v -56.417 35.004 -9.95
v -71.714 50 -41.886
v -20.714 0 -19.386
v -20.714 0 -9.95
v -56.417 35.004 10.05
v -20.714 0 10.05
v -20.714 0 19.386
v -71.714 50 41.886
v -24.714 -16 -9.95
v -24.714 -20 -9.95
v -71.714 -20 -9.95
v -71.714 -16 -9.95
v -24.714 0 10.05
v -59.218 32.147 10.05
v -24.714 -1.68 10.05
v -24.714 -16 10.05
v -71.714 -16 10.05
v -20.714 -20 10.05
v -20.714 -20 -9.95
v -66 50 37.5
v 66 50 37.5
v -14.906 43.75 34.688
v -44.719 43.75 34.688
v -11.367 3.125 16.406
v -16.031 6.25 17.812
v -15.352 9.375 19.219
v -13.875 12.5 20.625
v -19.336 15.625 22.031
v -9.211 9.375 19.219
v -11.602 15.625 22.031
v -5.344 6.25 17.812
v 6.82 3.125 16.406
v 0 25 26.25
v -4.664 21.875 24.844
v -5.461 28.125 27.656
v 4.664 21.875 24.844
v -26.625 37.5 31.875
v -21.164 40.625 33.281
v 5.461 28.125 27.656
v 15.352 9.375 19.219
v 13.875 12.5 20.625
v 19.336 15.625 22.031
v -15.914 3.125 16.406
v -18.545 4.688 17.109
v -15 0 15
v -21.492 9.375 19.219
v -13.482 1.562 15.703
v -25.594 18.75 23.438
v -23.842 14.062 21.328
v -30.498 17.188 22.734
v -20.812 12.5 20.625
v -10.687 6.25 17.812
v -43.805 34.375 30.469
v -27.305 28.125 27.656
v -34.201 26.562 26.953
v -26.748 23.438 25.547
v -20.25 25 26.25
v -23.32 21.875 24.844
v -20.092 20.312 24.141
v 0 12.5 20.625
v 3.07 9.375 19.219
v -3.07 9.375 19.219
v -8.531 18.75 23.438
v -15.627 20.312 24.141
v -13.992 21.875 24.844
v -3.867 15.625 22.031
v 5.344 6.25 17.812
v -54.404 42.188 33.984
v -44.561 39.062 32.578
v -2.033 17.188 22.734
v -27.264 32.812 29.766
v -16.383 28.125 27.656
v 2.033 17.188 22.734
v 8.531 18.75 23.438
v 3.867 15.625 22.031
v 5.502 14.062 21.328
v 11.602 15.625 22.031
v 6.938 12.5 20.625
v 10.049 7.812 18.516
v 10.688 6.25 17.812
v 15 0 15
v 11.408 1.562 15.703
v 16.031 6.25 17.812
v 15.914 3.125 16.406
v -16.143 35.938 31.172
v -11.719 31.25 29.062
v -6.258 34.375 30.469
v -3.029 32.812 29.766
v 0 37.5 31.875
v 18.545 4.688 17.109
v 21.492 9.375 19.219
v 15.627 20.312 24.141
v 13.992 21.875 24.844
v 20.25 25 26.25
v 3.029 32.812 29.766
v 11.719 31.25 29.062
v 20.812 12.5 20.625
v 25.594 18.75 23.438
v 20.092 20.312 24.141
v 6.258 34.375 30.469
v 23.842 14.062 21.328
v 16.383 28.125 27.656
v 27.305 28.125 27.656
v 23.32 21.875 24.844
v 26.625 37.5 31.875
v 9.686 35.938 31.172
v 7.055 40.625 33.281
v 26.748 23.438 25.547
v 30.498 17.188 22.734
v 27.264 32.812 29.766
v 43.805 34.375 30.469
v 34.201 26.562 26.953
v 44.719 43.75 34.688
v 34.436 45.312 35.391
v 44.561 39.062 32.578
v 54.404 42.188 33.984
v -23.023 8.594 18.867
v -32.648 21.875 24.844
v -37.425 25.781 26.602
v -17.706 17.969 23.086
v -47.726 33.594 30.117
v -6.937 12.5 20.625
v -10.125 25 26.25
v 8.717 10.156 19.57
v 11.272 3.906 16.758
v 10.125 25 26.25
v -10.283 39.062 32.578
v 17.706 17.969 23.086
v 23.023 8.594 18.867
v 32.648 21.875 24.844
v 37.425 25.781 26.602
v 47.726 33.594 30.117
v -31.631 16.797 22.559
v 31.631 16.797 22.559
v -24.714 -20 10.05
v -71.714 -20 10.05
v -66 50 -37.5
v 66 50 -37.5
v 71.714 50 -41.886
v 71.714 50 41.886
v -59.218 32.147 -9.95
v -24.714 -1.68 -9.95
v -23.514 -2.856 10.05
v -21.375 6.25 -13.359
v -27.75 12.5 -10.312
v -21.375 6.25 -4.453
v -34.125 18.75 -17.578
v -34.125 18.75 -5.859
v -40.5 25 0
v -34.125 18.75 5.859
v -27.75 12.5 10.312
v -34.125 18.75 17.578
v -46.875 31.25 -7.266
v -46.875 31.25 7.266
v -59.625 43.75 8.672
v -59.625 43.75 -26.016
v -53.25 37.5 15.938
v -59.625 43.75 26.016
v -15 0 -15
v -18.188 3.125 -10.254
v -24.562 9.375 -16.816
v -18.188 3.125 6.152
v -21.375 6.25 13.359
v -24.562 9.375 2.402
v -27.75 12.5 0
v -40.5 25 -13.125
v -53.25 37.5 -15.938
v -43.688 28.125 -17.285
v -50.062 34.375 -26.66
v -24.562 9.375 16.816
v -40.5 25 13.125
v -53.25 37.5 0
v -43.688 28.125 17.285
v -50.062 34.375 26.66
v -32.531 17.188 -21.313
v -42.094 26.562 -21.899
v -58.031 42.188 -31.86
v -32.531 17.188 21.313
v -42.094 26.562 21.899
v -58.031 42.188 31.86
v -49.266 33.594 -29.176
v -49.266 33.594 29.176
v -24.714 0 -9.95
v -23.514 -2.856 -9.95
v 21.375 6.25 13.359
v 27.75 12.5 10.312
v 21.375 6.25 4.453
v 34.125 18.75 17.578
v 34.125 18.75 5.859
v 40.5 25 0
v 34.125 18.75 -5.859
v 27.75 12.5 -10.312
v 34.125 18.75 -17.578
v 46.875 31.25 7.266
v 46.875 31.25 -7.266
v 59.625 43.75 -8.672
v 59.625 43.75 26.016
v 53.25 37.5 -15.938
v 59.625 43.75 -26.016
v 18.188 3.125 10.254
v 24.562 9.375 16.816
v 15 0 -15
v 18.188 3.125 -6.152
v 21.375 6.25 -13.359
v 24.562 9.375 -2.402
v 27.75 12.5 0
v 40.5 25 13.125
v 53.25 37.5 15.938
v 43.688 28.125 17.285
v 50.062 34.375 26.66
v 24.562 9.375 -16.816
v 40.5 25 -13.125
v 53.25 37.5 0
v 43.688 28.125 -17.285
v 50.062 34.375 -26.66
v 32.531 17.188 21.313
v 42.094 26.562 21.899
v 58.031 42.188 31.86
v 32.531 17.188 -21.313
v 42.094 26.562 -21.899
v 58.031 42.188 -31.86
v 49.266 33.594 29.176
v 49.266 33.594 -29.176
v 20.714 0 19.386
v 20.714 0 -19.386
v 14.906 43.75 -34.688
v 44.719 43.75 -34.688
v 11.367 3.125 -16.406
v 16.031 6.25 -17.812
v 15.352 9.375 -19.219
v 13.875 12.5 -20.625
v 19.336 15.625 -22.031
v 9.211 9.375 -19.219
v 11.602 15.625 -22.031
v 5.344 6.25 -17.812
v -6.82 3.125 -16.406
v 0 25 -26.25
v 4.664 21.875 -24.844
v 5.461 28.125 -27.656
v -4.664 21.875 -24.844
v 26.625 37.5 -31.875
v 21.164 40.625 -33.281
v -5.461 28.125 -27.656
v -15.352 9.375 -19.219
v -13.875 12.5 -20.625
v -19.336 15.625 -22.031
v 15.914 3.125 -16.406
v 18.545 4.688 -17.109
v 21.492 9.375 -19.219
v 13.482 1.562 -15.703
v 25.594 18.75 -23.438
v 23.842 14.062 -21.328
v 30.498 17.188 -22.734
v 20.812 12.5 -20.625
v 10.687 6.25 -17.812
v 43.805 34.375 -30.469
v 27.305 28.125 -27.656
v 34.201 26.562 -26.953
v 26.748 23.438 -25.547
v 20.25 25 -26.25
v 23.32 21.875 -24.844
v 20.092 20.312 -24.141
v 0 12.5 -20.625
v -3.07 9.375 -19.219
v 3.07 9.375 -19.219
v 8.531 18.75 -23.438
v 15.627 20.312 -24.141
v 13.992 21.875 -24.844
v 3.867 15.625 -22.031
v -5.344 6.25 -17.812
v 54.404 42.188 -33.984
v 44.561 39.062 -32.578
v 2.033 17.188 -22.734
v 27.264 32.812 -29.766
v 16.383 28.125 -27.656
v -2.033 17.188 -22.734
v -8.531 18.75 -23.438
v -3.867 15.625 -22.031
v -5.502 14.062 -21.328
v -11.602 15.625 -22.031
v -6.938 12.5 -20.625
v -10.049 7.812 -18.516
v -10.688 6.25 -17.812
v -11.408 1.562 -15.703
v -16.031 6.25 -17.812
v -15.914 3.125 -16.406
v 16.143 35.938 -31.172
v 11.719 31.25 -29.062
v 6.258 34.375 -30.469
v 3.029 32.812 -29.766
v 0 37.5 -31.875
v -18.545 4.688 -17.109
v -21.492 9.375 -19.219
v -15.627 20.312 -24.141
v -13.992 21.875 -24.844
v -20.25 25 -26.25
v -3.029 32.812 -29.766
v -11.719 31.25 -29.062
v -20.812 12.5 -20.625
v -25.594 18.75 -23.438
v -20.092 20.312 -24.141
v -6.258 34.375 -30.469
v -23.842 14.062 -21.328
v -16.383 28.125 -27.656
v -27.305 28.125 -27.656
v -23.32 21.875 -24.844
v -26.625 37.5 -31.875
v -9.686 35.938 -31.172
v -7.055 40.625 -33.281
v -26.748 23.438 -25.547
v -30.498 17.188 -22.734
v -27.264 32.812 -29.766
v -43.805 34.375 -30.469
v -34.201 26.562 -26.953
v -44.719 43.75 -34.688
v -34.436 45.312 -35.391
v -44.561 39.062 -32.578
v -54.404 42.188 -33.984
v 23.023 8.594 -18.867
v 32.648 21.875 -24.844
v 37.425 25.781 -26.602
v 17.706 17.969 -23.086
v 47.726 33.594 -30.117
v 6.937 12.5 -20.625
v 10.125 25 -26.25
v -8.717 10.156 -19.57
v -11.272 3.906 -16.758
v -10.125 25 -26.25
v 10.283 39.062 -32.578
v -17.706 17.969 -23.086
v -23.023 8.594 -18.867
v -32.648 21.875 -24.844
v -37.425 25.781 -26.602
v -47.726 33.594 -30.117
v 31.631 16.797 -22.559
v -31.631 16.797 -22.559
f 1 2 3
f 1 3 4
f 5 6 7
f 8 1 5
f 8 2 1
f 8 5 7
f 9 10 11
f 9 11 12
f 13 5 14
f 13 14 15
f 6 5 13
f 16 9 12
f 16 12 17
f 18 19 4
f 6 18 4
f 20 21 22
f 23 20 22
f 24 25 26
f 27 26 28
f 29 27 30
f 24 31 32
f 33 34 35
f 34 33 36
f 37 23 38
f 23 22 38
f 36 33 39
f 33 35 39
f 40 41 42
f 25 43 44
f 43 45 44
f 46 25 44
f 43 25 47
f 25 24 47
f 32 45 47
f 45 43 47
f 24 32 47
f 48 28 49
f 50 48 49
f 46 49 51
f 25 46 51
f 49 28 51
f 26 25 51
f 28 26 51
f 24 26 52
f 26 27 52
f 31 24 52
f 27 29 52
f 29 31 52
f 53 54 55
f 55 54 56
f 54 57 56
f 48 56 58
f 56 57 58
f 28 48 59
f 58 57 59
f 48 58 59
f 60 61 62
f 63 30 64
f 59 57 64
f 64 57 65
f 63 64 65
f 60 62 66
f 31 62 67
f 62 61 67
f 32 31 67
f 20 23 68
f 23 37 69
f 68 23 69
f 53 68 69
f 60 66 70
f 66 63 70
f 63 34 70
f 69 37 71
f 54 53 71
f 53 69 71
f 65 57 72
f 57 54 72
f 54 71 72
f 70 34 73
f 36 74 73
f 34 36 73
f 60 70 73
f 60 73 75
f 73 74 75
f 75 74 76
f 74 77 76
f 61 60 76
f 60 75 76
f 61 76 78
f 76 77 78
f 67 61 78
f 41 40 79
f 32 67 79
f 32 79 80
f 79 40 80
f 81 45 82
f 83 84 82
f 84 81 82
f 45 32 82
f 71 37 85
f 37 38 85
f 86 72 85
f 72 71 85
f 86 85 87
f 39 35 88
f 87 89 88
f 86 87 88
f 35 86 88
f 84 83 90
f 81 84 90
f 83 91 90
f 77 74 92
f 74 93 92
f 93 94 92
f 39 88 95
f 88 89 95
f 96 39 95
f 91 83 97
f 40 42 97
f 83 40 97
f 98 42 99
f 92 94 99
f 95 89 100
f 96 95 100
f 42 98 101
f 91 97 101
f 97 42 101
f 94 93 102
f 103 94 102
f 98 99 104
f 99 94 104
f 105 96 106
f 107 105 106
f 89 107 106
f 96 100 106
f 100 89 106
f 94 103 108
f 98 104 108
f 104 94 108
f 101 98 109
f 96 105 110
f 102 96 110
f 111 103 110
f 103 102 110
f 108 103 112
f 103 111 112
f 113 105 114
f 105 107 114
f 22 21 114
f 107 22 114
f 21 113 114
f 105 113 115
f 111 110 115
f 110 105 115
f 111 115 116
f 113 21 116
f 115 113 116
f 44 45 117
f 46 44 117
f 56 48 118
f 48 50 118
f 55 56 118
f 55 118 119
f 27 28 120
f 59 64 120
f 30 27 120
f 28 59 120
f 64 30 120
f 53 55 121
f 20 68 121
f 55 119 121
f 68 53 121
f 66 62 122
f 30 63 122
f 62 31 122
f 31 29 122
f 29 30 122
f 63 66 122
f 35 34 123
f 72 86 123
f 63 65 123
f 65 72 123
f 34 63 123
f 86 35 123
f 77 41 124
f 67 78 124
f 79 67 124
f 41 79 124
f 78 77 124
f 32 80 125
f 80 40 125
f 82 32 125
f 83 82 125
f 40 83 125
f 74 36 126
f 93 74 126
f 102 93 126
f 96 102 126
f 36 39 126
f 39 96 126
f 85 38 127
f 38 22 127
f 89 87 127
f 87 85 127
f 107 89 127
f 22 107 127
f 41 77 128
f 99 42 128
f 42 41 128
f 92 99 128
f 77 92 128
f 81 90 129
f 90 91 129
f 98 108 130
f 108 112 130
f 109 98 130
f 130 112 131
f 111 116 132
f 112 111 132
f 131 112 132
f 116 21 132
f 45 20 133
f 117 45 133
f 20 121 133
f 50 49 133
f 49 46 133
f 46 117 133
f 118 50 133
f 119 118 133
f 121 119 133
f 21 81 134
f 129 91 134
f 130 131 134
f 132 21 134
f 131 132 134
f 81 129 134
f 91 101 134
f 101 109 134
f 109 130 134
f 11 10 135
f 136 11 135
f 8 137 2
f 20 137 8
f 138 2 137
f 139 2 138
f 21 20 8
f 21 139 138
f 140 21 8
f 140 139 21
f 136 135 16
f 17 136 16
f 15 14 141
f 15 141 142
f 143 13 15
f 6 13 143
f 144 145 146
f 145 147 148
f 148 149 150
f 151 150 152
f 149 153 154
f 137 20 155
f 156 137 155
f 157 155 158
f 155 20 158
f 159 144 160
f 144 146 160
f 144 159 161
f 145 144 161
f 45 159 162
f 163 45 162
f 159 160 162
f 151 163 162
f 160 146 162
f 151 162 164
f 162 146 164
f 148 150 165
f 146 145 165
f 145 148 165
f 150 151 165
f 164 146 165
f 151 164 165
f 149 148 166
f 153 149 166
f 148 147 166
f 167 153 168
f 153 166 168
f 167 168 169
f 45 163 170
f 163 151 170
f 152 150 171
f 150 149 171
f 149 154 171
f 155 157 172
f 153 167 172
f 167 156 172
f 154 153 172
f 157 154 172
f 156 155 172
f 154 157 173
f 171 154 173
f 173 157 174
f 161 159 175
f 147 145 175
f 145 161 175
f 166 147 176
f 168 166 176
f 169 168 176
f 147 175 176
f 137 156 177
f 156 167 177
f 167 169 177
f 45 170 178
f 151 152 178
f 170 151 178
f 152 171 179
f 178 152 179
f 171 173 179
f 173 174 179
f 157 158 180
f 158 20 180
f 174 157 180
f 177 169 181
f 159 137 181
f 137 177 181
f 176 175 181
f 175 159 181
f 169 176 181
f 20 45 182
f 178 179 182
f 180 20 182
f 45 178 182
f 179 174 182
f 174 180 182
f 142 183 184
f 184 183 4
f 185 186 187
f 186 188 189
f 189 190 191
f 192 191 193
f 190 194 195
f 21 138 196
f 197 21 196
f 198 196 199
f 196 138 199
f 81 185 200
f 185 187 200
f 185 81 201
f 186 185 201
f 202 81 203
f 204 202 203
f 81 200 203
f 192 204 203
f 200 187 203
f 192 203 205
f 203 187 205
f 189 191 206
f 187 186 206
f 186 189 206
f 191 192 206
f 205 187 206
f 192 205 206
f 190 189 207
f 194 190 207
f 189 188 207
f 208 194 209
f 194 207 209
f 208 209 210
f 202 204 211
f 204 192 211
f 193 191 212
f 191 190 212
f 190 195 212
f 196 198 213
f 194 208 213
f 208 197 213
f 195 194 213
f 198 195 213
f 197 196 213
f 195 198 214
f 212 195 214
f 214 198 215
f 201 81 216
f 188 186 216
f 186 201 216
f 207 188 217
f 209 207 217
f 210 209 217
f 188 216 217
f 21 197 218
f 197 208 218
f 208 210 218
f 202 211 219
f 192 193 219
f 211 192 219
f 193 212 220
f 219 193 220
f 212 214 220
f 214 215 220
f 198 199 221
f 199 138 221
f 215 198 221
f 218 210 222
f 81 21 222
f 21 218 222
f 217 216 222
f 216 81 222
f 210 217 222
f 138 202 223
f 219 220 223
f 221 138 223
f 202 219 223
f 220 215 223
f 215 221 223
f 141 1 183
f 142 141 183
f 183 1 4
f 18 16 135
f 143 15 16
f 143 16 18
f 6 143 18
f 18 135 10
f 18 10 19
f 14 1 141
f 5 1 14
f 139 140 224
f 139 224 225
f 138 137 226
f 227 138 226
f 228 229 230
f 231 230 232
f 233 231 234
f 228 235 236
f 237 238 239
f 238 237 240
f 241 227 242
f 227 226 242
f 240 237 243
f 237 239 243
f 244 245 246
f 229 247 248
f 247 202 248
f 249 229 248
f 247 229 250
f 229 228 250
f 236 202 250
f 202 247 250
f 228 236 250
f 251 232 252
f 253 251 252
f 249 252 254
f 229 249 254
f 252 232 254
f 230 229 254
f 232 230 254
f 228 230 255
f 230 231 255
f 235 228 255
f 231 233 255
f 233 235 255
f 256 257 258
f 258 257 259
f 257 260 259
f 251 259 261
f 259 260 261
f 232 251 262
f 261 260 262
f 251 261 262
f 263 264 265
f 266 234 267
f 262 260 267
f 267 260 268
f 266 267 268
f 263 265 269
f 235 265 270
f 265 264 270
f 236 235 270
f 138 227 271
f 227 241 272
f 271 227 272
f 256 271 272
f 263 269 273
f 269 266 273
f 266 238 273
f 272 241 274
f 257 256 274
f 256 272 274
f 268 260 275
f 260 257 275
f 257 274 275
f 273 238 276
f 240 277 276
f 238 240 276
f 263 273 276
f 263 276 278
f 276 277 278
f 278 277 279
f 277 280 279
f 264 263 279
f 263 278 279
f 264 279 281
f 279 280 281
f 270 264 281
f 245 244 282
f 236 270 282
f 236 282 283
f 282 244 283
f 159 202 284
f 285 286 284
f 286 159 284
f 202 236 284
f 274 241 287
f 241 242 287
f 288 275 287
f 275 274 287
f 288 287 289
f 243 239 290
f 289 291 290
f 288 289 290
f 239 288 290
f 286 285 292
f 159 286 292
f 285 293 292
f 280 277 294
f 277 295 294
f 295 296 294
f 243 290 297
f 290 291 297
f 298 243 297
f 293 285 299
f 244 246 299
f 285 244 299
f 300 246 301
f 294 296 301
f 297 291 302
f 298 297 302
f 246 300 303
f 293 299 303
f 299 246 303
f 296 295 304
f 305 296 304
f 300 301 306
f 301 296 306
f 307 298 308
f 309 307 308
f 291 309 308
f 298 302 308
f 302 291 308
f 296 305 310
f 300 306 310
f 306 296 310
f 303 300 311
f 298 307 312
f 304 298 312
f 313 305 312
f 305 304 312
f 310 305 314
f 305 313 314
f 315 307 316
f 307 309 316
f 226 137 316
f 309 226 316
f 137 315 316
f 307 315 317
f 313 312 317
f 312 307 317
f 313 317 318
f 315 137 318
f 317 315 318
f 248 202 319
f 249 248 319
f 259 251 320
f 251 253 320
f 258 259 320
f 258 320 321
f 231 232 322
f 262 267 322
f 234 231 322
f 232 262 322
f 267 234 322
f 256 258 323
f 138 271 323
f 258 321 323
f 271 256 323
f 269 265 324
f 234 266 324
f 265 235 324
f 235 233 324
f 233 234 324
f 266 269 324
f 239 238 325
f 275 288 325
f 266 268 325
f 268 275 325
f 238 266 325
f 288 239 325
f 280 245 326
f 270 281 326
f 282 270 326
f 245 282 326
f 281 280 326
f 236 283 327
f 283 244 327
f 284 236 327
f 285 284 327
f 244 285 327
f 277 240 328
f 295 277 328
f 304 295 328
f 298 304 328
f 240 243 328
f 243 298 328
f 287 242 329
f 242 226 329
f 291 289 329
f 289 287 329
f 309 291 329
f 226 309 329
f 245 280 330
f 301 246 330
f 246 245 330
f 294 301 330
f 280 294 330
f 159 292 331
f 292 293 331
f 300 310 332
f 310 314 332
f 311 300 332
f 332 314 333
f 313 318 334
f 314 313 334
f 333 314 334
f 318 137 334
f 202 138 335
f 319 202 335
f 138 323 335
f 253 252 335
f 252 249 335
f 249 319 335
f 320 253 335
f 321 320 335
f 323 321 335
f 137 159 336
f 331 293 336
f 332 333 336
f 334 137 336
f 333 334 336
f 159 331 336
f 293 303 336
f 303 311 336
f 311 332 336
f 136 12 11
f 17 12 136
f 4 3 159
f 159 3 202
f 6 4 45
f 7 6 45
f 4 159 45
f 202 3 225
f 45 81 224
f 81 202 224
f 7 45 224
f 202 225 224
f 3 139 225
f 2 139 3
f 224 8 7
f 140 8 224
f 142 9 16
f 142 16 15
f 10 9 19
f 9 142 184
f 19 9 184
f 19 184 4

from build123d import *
from build123d.topology import SkipClean

# Parameters (mm, degrees)
SHELL1_T                 = 4
SKETCH4_W                = 50
SKETCH4_H                = 20
BOSS_EXTRUDE1_DEPTH      = 4
BOSS_EXTRUDE2_DEPTH      = 10.049697
BOSS_EXTRUDE2_DEPTH_BACK = 9.950303
SKETCH7_W                = 4
SKETCH7_H                = 20
SKETCH8_W                = 20
SKETCH8_H                = 4
BOSS_EXTRUDE3_DEPTH      = 47


with BuildPart() as part:
    # Boundary1: read off the stored shape, not the designer's step
    # Boundary1: loft between two sections, ruled curve by curve
    boundary1_from = [
        Edge.make_line((-15, 0, 15), (15, 0, 15)),
        Edge.make_line((15, 0, 15), (15, 0, -15)),
        Edge.make_line((15, 0, -15), (-15, 0, -15)),
        Edge.make_line((-15, 0, -15), (-15, 0, 15)),
    ]
    boundary1_to = [
        Edge.make_line((-66, 50, 37.5), (66, 50, 37.5)),
        Edge.make_line((66, 50, 37.5), (66, 50, -37.5)),
        Edge.make_line((66, 50, -37.5), (-66, 50, -37.5)),
        Edge.make_line((-66, 50, -37.5), (-66, 50, 37.5)),
    ]
    boundary1 = Solid(Shell([*[Face.make_surface_from_curves(boundary1_from[k], boundary1_to[k]) for k in range(4)], Face(Wire(boundary1_from)), Face(Wire(boundary1_to))]))
    add(boundary1)

    # Shell1
    shell1_openings = [part.faces().sort_by_distance(p)[0] for p in [
        (0, 0, 0),
        (0, 50, 0),
    ]]
    offset(amount=SHELL1_T, openings=shell1_openings, kind=Kind.INTERSECTION)

    # Sketch4 → Boss-Extrude1 (add)
    with BuildSketch(Plane(origin=(-10.15178535, -10.354821057, 0), x_dir=(0.7140728391445788, -0.7000714109260574, 0), z_dir=(-0.7000714109260574, -0.7140728391445788, 0))):
        with Locations((-39.791092587, 0.049697146)):
            Rectangle(SKETCH4_W, SKETCH4_H)
    extrude(amount=BOSS_EXTRUDE1_DEPTH)

    # Sketch7 → Boss-Extrude2 (add, two sides: drawn at the far end of the back side and taken through both)
    with SkipClean():  # the faces are left unmerged after this step: merging them gives an invalid solid
        with BuildSketch(Plane.XY.offset(-BOSS_EXTRUDE2_DEPTH_BACK)):
            with Locations((-22.713702827, -10)):
                Rectangle(SKETCH7_W, SKETCH7_H)
        extrude(amount=BOSS_EXTRUDE2_DEPTH + BOSS_EXTRUDE2_DEPTH_BACK)

    # Sketch8 → Boss-Extrude3 (add)
    with SkipClean():  # the faces are left unmerged after this step: merging them gives an invalid solid
        with BuildSketch(Plane.ZY.offset(24.713702827)):
            with Locations((0.049697146, -18)):
                Rectangle(SKETCH8_W, SKETCH8_H)
        extrude(amount=BOSS_EXTRUDE3_DEPTH)


solid = part.part
